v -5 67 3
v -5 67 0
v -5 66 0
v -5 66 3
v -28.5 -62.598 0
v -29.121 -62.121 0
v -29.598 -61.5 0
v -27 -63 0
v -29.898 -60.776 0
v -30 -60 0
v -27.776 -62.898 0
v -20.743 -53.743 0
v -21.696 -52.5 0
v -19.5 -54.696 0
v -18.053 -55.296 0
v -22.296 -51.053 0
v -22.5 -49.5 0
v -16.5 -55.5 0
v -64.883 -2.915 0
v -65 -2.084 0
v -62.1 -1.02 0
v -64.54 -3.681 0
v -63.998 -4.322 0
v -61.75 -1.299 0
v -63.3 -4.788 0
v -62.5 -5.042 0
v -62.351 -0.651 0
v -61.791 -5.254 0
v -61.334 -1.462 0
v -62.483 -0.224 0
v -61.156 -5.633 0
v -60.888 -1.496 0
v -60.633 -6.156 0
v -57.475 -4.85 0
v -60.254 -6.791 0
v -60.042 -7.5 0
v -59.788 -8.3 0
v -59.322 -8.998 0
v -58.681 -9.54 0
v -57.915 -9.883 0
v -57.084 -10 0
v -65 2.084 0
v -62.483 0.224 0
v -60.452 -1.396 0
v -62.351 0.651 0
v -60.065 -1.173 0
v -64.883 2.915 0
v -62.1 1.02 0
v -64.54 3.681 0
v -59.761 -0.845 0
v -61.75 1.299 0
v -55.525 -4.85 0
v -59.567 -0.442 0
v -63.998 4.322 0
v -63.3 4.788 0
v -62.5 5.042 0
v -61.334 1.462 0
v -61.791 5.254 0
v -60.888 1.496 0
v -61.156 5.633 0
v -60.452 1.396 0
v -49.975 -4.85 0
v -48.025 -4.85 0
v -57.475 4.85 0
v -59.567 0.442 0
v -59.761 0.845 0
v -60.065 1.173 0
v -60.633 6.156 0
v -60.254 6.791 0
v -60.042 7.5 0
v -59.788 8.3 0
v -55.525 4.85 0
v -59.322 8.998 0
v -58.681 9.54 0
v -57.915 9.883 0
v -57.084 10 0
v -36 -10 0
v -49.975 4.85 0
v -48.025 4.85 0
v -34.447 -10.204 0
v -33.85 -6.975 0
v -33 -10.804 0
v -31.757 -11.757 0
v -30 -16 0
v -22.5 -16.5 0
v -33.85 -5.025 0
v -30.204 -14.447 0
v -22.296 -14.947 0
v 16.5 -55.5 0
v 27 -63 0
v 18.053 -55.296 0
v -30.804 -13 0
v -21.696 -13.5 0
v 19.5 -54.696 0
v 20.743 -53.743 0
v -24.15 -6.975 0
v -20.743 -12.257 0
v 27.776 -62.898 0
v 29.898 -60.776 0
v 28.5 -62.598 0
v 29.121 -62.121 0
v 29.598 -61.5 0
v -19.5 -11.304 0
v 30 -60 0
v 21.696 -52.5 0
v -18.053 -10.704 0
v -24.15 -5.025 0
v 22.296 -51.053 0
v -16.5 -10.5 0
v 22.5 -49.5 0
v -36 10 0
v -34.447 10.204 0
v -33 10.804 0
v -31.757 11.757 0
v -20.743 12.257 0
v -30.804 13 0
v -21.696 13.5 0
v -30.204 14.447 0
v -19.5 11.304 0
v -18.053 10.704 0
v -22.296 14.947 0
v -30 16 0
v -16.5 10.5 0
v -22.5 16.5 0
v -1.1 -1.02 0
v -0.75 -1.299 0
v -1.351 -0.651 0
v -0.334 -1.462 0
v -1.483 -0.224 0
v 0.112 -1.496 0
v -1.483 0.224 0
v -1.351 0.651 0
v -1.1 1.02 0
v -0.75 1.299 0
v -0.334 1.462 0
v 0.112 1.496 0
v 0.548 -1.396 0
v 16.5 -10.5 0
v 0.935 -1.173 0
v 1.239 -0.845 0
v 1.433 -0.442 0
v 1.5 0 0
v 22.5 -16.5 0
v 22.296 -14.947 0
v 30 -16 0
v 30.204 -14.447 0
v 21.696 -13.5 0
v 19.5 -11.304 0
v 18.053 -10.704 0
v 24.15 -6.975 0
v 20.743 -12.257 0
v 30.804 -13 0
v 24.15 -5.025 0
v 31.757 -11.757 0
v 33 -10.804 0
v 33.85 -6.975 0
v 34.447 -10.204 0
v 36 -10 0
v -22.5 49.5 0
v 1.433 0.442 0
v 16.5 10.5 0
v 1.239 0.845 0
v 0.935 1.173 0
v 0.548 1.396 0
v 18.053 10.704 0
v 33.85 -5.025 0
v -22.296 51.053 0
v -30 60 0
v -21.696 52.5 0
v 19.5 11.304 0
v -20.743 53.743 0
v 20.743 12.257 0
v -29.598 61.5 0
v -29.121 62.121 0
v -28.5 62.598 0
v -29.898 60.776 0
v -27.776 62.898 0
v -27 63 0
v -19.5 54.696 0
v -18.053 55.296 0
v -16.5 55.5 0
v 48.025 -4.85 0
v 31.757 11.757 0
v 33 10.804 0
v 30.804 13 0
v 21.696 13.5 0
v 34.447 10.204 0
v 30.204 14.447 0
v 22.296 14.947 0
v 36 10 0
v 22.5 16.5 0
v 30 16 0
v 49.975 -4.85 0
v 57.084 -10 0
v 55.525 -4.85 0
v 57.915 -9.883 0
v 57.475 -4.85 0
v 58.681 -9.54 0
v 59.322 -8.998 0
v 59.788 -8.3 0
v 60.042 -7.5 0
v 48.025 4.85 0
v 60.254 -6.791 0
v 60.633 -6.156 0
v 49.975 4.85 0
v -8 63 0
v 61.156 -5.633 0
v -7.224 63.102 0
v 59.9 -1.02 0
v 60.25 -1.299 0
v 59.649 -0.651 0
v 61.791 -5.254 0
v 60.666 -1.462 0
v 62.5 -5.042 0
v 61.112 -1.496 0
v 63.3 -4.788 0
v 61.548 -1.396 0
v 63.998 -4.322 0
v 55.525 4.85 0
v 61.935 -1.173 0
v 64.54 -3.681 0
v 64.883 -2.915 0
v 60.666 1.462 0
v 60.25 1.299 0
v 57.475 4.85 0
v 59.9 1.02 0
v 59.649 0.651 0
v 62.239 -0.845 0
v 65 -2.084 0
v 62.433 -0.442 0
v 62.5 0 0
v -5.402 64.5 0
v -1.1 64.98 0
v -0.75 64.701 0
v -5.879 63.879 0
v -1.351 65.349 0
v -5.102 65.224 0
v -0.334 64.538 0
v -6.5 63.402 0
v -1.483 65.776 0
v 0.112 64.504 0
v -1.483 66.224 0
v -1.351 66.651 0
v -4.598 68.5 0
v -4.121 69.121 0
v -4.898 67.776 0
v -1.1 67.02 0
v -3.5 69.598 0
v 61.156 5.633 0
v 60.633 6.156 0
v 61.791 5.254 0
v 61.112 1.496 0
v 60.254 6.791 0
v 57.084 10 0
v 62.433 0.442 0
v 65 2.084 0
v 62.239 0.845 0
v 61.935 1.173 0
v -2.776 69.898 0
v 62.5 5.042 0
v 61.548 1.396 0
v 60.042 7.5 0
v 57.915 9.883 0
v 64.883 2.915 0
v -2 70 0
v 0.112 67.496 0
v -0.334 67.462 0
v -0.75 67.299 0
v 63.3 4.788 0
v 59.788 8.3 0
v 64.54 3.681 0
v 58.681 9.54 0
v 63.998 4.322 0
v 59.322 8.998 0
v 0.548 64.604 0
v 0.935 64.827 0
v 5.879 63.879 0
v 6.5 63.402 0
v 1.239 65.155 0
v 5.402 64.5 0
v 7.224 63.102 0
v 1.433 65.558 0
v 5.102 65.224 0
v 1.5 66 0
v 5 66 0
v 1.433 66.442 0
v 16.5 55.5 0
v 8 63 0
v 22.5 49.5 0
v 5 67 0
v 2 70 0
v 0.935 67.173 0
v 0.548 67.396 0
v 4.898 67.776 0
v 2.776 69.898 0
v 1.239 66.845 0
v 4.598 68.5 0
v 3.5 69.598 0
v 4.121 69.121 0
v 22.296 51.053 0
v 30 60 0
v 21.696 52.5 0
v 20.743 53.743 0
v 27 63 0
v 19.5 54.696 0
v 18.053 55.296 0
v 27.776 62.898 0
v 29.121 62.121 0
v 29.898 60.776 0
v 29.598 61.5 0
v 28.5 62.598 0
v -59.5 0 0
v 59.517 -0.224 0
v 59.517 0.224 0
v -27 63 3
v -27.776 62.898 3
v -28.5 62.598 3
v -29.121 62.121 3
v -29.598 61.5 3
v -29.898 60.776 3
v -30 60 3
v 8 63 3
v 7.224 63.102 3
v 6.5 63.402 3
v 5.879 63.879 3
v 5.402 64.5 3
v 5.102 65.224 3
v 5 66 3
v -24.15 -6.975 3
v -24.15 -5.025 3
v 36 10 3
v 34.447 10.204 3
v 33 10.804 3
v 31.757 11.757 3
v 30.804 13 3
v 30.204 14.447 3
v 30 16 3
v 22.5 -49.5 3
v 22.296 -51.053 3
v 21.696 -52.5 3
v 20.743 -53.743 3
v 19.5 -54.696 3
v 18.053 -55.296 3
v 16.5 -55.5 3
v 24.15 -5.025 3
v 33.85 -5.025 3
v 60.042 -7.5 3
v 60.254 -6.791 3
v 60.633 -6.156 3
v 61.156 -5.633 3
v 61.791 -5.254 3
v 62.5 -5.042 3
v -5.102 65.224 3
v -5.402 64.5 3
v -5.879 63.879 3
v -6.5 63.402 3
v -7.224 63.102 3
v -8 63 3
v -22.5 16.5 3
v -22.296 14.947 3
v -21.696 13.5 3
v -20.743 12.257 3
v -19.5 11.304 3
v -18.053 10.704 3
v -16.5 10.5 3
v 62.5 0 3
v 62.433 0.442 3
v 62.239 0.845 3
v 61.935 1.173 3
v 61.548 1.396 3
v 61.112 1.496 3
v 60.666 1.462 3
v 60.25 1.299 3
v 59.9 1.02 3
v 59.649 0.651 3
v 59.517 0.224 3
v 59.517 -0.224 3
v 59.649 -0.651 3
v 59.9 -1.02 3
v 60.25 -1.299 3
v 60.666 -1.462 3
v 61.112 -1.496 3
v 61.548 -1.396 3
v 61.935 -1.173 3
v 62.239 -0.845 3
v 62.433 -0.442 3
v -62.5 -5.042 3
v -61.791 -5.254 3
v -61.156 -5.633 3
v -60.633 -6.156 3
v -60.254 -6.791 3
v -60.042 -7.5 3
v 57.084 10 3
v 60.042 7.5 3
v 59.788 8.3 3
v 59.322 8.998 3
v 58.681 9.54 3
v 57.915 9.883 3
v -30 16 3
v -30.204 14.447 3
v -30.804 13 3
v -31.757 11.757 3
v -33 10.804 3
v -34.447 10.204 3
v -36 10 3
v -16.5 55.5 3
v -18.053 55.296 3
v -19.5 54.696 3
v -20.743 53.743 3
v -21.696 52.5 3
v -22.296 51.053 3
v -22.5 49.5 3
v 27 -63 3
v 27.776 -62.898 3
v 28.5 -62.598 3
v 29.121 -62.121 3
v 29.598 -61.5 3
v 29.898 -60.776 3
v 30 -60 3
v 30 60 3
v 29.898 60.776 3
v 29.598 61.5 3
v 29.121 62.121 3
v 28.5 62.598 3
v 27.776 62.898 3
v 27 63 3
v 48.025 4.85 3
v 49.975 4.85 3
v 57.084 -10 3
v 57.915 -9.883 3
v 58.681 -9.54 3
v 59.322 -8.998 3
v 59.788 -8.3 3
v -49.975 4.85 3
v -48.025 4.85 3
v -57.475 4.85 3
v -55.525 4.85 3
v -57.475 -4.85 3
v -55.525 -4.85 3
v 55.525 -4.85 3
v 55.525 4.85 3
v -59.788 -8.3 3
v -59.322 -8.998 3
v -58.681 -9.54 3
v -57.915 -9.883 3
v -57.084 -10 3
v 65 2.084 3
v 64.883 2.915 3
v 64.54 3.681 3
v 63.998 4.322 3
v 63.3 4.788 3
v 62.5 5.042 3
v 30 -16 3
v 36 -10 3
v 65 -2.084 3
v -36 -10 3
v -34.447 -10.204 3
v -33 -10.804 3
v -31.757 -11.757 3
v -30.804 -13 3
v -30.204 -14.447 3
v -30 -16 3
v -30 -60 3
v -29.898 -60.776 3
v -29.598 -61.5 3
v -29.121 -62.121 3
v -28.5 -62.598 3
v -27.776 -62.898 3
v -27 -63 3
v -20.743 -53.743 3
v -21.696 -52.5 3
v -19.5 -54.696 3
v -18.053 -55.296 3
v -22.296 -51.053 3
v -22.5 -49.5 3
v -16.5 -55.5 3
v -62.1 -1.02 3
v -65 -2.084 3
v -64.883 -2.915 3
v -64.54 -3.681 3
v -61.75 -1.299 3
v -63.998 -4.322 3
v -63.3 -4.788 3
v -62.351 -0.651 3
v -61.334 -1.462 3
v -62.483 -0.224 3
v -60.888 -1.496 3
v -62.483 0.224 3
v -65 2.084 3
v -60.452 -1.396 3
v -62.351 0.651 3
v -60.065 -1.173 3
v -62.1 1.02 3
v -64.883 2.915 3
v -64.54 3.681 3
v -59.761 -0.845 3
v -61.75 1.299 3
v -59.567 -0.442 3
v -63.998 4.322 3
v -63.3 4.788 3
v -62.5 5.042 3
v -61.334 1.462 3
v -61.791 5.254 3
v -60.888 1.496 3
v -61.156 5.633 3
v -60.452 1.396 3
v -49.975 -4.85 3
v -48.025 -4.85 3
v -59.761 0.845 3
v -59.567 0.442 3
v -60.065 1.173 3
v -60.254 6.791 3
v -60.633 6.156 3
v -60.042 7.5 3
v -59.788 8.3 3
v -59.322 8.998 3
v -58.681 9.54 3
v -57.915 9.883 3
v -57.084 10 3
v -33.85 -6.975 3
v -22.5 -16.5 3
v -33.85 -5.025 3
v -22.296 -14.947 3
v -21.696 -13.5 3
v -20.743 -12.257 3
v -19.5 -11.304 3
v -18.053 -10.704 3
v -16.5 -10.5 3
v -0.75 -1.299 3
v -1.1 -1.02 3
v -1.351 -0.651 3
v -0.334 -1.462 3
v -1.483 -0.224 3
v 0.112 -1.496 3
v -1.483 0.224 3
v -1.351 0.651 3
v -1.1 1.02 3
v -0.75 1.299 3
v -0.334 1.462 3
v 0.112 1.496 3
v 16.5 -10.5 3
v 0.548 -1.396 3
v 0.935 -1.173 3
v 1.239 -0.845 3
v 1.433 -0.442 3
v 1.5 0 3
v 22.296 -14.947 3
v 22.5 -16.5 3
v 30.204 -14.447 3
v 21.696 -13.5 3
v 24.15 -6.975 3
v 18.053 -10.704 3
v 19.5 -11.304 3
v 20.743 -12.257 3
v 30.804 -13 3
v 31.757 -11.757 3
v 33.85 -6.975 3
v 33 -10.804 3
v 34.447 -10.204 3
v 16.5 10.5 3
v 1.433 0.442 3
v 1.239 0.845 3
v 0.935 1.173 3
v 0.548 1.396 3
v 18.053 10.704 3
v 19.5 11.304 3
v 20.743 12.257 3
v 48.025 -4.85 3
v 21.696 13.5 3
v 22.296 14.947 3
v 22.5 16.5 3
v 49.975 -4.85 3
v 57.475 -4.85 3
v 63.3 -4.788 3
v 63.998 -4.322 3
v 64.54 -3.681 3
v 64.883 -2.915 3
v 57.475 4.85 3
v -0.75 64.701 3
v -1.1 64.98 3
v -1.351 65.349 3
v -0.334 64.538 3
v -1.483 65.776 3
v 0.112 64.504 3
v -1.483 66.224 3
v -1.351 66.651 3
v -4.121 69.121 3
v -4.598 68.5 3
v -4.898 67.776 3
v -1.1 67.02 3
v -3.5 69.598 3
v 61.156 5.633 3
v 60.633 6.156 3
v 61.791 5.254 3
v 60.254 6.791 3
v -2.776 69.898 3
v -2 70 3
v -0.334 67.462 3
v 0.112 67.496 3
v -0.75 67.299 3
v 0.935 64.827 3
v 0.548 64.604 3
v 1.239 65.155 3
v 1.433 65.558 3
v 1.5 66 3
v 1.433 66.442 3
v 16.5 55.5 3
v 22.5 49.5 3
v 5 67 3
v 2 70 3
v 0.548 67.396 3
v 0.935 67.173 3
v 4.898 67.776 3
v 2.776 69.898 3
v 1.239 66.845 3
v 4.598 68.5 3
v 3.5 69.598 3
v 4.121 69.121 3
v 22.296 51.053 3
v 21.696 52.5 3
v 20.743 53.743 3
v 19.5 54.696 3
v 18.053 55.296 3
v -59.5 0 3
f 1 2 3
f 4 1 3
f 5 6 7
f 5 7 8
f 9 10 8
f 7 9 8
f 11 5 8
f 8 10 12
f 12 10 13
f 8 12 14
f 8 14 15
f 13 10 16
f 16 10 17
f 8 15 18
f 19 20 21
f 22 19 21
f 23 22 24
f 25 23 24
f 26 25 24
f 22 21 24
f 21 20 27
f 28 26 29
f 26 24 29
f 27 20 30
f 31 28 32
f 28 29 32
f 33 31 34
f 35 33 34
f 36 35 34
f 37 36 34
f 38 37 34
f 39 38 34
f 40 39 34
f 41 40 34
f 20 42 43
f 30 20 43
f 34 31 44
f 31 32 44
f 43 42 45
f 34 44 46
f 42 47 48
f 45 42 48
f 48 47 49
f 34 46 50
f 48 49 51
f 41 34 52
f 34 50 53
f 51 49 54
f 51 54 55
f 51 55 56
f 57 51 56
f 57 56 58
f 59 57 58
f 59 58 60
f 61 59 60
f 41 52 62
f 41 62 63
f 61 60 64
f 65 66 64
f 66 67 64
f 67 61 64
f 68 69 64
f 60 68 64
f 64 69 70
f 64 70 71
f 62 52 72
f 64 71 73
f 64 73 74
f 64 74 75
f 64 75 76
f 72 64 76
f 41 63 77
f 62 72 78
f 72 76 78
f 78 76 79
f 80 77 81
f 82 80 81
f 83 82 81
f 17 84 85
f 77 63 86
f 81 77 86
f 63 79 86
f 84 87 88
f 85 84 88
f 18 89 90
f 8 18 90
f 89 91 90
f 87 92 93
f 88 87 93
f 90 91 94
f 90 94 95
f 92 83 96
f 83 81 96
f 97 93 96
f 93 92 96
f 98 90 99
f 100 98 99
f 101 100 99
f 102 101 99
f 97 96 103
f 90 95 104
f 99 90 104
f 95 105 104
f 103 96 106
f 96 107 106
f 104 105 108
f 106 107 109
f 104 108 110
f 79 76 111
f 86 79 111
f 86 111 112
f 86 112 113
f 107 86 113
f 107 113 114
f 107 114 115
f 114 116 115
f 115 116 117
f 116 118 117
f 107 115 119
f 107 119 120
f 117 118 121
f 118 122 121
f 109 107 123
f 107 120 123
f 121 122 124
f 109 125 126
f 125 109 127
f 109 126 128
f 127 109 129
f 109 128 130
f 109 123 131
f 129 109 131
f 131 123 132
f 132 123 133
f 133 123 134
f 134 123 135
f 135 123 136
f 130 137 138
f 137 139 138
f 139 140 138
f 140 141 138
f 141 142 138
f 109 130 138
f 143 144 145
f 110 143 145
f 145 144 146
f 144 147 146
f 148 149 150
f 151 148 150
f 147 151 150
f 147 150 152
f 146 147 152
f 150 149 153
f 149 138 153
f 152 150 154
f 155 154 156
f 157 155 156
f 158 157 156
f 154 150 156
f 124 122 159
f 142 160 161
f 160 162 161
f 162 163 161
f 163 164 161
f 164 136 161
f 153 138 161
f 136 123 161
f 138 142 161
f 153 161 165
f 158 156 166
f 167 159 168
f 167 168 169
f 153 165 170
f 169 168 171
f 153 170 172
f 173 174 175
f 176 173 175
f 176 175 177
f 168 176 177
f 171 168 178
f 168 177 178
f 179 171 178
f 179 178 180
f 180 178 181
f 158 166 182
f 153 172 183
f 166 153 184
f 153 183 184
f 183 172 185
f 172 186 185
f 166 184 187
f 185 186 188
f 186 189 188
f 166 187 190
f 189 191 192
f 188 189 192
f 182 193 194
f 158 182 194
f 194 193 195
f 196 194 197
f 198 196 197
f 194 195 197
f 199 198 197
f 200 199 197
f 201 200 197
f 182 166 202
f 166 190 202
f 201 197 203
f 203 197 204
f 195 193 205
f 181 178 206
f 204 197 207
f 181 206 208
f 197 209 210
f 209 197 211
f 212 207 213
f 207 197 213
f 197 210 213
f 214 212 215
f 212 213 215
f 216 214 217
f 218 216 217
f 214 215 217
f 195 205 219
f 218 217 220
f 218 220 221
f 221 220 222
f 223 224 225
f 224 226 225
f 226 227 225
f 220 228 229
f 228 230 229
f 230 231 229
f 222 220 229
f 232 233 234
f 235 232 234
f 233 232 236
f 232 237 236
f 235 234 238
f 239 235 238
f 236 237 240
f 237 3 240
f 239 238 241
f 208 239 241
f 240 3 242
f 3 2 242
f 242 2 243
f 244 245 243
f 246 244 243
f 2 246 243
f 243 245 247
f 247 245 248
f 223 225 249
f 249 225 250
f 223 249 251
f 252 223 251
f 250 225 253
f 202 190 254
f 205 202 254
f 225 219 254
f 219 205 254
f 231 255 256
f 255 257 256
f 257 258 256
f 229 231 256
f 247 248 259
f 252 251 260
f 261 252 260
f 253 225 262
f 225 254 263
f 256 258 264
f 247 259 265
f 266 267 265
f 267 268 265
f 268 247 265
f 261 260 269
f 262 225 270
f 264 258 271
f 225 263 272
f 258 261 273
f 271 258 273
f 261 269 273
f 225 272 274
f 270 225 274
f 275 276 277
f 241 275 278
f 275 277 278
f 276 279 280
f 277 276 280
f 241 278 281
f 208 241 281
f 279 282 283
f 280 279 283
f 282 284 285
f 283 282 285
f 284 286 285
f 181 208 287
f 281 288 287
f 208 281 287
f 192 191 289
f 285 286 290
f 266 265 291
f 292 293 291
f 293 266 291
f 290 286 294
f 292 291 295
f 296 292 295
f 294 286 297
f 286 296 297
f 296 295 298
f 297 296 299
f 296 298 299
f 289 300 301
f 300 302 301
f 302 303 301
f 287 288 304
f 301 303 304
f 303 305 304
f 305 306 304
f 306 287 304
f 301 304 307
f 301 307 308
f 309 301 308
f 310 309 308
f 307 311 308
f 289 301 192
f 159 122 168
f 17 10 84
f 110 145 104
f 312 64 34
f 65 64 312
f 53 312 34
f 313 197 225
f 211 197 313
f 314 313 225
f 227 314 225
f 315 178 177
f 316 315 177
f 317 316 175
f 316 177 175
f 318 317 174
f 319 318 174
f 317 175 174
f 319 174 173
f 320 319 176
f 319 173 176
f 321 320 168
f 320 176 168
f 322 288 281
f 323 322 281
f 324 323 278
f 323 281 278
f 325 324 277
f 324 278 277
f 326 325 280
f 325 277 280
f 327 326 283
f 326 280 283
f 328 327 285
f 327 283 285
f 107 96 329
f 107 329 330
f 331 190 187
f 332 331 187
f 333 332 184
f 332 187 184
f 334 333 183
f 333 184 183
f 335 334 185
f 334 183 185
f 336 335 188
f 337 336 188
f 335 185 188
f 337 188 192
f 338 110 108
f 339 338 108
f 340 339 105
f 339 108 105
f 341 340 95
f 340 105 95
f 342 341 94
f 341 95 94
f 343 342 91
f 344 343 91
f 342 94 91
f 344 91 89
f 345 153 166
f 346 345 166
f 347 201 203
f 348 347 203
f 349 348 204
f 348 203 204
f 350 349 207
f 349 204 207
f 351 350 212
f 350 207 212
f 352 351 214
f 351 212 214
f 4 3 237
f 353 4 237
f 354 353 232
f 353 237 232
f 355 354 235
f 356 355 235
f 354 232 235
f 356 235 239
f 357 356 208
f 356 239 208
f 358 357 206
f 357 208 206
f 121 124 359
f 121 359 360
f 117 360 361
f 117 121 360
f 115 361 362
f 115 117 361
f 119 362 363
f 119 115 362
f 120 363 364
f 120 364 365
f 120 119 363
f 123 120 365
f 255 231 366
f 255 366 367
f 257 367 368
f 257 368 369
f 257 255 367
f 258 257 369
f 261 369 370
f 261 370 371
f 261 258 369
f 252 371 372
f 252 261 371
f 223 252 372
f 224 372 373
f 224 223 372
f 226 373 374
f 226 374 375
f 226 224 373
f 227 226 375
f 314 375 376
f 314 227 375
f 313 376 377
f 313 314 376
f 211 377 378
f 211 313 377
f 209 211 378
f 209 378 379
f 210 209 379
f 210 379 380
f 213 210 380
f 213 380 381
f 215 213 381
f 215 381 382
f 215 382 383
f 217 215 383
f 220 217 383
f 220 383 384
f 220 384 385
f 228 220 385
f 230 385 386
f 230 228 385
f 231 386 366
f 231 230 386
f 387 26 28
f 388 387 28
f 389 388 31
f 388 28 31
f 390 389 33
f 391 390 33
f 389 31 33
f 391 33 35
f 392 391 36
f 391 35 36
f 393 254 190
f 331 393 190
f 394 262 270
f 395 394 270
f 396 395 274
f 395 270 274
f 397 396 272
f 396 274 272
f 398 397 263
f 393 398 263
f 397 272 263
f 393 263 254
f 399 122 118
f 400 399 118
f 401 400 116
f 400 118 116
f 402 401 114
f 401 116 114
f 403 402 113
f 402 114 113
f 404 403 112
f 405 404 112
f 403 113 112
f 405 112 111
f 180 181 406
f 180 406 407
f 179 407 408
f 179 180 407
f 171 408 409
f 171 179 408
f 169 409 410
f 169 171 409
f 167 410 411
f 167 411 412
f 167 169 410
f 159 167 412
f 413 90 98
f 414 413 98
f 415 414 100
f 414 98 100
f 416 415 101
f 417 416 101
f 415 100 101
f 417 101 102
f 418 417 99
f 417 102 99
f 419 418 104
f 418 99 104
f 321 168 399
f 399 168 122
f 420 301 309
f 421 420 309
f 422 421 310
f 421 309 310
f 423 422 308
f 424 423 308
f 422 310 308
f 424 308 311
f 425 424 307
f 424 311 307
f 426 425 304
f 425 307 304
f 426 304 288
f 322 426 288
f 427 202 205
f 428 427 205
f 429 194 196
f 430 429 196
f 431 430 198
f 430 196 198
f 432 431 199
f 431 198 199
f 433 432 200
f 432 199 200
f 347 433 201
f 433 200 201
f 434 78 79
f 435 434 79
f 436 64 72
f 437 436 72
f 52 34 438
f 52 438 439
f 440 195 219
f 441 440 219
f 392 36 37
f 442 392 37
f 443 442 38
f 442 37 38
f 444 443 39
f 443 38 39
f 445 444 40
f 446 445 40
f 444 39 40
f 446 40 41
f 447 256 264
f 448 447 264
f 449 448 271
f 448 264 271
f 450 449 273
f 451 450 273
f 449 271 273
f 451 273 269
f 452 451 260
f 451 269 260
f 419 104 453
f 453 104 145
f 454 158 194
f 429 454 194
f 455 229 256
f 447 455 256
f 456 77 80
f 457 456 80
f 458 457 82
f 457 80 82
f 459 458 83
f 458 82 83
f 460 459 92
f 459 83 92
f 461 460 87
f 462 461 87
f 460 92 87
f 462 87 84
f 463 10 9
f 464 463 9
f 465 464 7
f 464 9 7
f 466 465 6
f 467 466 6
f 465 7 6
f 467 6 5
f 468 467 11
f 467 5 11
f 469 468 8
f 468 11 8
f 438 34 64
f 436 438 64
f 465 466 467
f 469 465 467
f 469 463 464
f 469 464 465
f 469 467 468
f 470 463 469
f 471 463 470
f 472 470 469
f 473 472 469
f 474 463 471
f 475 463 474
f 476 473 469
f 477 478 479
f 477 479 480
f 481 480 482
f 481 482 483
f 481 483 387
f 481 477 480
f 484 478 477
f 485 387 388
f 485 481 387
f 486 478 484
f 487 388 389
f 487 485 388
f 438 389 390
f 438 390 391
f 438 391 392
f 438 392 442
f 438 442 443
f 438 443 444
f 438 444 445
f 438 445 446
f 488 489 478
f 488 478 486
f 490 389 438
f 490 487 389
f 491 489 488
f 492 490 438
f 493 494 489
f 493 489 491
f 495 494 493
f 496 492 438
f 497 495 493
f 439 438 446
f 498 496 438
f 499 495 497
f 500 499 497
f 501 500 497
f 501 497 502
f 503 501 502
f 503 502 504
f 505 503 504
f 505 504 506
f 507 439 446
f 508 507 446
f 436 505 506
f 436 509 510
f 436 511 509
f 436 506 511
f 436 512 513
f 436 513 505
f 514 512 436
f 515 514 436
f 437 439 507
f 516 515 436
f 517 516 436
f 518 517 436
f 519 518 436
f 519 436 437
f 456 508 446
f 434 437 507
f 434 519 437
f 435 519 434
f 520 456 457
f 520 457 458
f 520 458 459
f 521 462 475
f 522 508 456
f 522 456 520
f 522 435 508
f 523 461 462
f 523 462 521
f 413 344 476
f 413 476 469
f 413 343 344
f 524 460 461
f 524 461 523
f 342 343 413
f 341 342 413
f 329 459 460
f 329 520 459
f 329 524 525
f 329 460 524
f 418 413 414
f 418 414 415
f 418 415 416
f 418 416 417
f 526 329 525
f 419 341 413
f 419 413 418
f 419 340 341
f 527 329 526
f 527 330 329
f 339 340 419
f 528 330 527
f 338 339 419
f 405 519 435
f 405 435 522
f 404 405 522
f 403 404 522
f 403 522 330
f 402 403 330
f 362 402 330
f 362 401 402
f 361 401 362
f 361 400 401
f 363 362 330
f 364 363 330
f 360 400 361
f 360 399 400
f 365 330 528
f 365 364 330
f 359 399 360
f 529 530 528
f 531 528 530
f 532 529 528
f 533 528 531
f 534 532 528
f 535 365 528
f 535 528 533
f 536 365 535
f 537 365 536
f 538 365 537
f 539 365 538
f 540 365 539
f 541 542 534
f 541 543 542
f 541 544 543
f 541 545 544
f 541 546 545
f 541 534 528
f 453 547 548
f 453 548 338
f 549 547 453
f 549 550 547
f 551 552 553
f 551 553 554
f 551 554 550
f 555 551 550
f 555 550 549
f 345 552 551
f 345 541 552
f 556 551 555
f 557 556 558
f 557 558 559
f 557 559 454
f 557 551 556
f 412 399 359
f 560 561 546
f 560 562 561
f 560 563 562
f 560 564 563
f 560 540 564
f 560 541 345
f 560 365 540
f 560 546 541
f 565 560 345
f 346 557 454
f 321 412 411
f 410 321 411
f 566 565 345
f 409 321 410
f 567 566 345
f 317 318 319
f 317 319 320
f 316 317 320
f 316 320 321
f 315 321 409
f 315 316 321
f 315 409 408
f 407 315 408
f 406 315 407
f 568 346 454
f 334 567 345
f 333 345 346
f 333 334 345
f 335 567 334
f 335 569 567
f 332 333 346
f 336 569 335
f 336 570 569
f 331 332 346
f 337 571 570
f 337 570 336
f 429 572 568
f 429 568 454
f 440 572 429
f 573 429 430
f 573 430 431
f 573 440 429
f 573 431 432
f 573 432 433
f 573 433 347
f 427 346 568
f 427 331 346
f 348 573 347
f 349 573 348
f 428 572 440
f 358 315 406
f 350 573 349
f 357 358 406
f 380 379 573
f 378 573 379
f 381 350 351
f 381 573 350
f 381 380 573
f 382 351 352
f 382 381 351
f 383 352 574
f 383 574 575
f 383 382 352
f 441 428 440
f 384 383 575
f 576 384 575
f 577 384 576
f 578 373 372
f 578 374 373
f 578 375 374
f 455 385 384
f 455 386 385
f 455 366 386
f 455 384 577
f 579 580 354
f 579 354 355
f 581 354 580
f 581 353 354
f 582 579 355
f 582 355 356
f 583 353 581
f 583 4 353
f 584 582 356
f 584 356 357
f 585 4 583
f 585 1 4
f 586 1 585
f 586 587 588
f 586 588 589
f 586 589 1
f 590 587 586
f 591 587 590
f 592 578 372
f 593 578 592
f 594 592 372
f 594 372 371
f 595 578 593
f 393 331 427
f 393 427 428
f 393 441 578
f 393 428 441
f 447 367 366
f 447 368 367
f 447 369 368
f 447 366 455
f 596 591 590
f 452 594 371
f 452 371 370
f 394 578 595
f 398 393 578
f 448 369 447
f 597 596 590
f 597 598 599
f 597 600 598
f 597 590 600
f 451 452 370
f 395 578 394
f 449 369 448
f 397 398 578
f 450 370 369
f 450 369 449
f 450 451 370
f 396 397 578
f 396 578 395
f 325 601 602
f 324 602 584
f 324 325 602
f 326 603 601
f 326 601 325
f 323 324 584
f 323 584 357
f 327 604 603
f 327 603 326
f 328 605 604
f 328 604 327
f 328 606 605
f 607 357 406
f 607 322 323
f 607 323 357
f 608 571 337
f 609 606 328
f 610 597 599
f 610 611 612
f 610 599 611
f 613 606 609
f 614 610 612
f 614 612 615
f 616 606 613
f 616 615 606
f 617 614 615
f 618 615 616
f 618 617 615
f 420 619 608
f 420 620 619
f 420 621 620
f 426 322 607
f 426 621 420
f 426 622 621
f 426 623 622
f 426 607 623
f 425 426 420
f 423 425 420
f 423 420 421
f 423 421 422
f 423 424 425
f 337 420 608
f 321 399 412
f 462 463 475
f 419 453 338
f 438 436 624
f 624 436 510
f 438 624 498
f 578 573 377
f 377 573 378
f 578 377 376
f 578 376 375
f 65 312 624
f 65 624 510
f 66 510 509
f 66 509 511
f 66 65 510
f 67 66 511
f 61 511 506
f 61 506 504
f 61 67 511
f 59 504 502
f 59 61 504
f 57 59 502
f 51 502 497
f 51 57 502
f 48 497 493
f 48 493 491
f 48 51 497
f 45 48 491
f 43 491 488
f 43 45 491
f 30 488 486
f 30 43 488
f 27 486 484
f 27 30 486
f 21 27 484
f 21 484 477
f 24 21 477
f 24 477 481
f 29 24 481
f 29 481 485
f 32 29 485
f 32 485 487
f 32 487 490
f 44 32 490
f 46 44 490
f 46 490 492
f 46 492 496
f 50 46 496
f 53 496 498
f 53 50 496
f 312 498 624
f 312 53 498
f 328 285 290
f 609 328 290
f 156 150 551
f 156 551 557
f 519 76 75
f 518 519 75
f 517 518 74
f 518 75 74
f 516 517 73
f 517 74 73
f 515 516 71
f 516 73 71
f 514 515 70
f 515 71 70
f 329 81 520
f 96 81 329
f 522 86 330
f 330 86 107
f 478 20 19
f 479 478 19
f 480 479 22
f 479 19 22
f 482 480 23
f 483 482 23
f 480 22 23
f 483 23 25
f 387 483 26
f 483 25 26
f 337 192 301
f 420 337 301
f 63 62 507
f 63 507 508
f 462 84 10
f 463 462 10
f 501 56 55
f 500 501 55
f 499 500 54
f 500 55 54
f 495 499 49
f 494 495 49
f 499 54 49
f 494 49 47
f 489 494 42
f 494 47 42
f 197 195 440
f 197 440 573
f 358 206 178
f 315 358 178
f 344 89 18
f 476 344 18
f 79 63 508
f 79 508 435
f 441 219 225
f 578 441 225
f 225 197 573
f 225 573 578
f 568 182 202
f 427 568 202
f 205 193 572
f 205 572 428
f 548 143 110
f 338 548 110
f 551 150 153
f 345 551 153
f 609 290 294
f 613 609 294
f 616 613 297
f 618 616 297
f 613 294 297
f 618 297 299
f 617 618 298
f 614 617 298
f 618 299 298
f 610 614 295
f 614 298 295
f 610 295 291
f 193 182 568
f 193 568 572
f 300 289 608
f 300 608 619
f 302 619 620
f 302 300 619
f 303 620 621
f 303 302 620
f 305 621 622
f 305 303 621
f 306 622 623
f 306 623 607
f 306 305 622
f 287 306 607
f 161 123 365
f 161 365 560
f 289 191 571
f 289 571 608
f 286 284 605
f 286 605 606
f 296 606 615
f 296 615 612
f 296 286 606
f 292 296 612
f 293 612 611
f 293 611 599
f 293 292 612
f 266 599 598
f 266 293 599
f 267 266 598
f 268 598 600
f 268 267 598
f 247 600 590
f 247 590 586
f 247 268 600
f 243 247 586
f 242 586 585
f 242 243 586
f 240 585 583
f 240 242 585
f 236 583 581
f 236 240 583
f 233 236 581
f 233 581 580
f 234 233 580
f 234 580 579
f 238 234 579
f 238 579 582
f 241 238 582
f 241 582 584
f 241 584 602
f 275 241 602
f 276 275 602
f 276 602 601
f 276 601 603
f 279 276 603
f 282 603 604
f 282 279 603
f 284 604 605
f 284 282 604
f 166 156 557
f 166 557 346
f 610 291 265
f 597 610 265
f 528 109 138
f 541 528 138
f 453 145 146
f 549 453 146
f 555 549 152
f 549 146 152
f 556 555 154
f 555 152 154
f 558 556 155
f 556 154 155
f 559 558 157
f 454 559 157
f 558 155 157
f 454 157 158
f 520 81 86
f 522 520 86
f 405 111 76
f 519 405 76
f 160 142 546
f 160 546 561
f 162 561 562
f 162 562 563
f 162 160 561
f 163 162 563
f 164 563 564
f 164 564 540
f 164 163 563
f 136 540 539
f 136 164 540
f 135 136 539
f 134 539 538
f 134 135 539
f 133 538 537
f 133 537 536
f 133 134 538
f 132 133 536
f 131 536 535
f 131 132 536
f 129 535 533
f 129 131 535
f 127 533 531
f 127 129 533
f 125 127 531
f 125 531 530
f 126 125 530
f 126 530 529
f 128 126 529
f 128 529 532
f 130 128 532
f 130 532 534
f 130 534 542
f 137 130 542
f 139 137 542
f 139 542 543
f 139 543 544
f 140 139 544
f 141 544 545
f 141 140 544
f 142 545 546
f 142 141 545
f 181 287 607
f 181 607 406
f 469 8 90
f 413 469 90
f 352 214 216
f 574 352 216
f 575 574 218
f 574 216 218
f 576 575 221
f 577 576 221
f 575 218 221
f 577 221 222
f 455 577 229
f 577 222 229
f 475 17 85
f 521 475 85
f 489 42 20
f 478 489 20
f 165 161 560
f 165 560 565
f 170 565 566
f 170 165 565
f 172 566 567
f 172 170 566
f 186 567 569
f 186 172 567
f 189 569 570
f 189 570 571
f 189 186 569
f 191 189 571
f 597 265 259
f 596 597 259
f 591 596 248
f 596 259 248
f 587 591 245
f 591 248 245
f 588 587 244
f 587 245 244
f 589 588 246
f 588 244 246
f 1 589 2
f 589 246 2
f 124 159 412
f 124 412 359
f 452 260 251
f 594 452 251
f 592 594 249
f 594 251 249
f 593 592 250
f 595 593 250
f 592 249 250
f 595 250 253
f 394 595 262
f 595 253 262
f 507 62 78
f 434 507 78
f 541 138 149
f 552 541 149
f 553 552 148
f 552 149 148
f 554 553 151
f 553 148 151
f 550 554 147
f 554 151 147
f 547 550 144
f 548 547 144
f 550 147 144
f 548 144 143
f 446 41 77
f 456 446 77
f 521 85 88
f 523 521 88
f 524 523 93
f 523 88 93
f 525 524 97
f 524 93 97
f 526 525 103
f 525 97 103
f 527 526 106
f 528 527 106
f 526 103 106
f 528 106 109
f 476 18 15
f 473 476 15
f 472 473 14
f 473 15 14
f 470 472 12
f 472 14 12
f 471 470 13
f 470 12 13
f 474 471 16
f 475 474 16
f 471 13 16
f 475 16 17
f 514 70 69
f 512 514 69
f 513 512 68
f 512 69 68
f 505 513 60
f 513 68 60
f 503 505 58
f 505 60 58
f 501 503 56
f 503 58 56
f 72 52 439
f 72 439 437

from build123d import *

# Parameters (mm, degrees)
MODEL_R         = 1.5
MODEL_W         = 9.700000003
MODEL_H         = 1.95
MODEL_W_2       = 1.95
MODEL_H_2       = 9.700000003
MODEL_H_3       = 9.7
EXTRUDE_1_DEPTH = 3


with BuildPart() as part:
    # Model → Бобышка-Вытянуть1 (new body)
    with BuildSketch(Plane.XY):
        with BuildLine():
            Line((36, -10), (57.083920217, -10))
            ThreePointArc((57.083920217, -10), (59.02041189, -9.291287847), (60.041960108, -7.5))
            ThreePointArc((60.041960108, -7.5), (60.878679656, -5.878679656), (62.5, -5.041960108))
            ThreePointArc((62.5, -5.041960108), (64.291287847, -4.02041189), (65, -2.083920217))
            Line((65, -2.083920217), (65, 2.083920217))
            ThreePointArc((65, 2.083920217), (64.291287847, 4.02041189), (62.5, 5.041960108))
            ThreePointArc((62.5, 5.041960108), (60.878679656, 5.878679656), (60.041960108, 7.5))
            ThreePointArc((60.041960108, 7.5), (59.02041189, 9.291287847), (57.083920217, 10))
            Line((57.083920217, 10), (36, 10))
            ThreePointArc((36, 10), (31.757359313, 11.757359313), (30, 16))
            Line((30, 16), (30, 60))
            ThreePointArc((30, 60), (29.121320344, 62.121320344), (27, 63))
            Line((27, 63), (8, 63))
            ThreePointArc((8, 63), (5.878679656, 63.878679656), (5, 66))
            Line((5, 66), (5, 67))
            ThreePointArc((5, 67), (4.121320344, 69.121320344), (2, 70))
            Line((2, 70), (-2, 70))
            ThreePointArc((-2, 70), (-4.121320344, 69.121320344), (-5, 67))
            Line((-5, 67), (-5, 66))
            ThreePointArc((-5, 66), (-5.878679656, 63.878679656), (-8, 63))
            Line((-8, 63), (-27, 63))
            ThreePointArc((-27, 63), (-29.121320344, 62.121320344), (-30, 60))
            Line((-30, 60), (-30, 16))
            ThreePointArc((-30, 16), (-31.757359313, 11.757359313), (-36, 10))
            Line((-36, 10), (-57.083920217, 10))
            ThreePointArc((-57.083920217, 10), (-59.02041189, 9.291287847), (-60.041960108, 7.5))
            ThreePointArc((-60.041960108, 7.5), (-60.878679656, 5.878679656), (-62.5, 5.041960108))
            ThreePointArc((-62.5, 5.041960108), (-64.291287847, 4.02041189), (-65, 2.083920217))
            Line((-65, 2.083920217), (-65, -2.083920217))
            ThreePointArc((-65, -2.083920217), (-64.291287847, -4.02041189), (-62.5, -5.041960108))
            ThreePointArc((-62.5, -5.041960108), (-60.878679656, -5.878679656), (-60.041960108, -7.5))
            ThreePointArc((-60.041960108, -7.5), (-59.02041189, -9.291287847), (-57.083920217, -10))
            Line((-57.083920217, -10), (-36, -10))
            ThreePointArc((-36, -10), (-31.757359313, -11.757359313), (-30, -16))
            Line((-30, -16), (-30, -60))
            ThreePointArc((-30, -60), (-29.121320344, -62.121320344), (-27, -63))
            Line((-27, -63), (8, -63))
            Line((8, -63), (27, -63))
            ThreePointArc((27, -63), (29.121320344, -62.121320344), (30, -60))
            Line((30, -60), (30, -16))
            ThreePointArc((30, -16), (31.757359313, -11.757359313), (36, -10))
        make_face()
        Circle(MODEL_R, mode=Mode.SUBTRACT)
        with Locations((0, 66)):
            Circle(MODEL_R, mode=Mode.SUBTRACT)
        with Locations((61, 0)):
            Circle(MODEL_R, mode=Mode.SUBTRACT)
        with Locations((-61, 0)):
            Circle(MODEL_R, mode=Mode.SUBTRACT)
        with Locations((-29.000000002, -6)):
            Rectangle(MODEL_W, MODEL_H, mode=Mode.SUBTRACT)
        with Locations((28.999999999, -6)):
            Rectangle(MODEL_W, MODEL_H, mode=Mode.SUBTRACT)
        with Locations((49, -1e-09)):
            Rectangle(MODEL_W_2, MODEL_H_2, mode=Mode.SUBTRACT)
        with Locations((-49, 0)):
            Rectangle(MODEL_W_2, MODEL_H_3, mode=Mode.SUBTRACT)
        with Locations((-56.5, 0)):
            Rectangle(MODEL_W_2, MODEL_H_3, mode=Mode.SUBTRACT)
        with Locations((56.5, 0)):
            Rectangle(MODEL_W_2, MODEL_H_3, mode=Mode.SUBTRACT)
        with BuildLine():
            Line((-16.5, 10.5), (16.5, 10.5))
            ThreePointArc((16.5, 10.5), (20.742640687, 12.257359313), (22.5, 16.5))
            Line((22.5, 16.5), (22.5, 49.5))
            ThreePointArc((22.5, 49.5), (20.742640687, 53.742640687), (16.5, 55.5))
            Line((16.5, 55.5), (-16.5, 55.5))
            ThreePointArc((-16.5, 55.5), (-20.742640687, 53.742640687), (-22.5, 49.5))
            Line((-22.5, 49.5), (-22.5, 16.5))
            ThreePointArc((-22.5, 16.5), (-20.742640687, 12.257359313), (-16.5, 10.5))
        make_face(mode=Mode.SUBTRACT)
        with BuildLine():
            Line((-16.5, -10.5), (16.5, -10.5))
            ThreePointArc((16.5, -10.5), (20.742640687, -12.257359313), (22.5, -16.5))
            Line((22.5, -16.5), (22.5, -49.5))
            ThreePointArc((22.5, -49.5), (20.742640687, -53.742640687), (16.5, -55.5))
            Line((16.5, -55.5), (-16.5, -55.5))
            ThreePointArc((-16.5, -55.5), (-20.742640687, -53.742640687), (-22.5, -49.5))
            Line((-22.5, -49.5), (-22.5, -16.5))
            ThreePointArc((-22.5, -16.5), (-20.742640687, -12.257359313), (-16.5, -10.5))
        make_face(mode=Mode.SUBTRACT)
    extrude(amount=EXTRUDE_1_DEPTH)


solid = part.part
